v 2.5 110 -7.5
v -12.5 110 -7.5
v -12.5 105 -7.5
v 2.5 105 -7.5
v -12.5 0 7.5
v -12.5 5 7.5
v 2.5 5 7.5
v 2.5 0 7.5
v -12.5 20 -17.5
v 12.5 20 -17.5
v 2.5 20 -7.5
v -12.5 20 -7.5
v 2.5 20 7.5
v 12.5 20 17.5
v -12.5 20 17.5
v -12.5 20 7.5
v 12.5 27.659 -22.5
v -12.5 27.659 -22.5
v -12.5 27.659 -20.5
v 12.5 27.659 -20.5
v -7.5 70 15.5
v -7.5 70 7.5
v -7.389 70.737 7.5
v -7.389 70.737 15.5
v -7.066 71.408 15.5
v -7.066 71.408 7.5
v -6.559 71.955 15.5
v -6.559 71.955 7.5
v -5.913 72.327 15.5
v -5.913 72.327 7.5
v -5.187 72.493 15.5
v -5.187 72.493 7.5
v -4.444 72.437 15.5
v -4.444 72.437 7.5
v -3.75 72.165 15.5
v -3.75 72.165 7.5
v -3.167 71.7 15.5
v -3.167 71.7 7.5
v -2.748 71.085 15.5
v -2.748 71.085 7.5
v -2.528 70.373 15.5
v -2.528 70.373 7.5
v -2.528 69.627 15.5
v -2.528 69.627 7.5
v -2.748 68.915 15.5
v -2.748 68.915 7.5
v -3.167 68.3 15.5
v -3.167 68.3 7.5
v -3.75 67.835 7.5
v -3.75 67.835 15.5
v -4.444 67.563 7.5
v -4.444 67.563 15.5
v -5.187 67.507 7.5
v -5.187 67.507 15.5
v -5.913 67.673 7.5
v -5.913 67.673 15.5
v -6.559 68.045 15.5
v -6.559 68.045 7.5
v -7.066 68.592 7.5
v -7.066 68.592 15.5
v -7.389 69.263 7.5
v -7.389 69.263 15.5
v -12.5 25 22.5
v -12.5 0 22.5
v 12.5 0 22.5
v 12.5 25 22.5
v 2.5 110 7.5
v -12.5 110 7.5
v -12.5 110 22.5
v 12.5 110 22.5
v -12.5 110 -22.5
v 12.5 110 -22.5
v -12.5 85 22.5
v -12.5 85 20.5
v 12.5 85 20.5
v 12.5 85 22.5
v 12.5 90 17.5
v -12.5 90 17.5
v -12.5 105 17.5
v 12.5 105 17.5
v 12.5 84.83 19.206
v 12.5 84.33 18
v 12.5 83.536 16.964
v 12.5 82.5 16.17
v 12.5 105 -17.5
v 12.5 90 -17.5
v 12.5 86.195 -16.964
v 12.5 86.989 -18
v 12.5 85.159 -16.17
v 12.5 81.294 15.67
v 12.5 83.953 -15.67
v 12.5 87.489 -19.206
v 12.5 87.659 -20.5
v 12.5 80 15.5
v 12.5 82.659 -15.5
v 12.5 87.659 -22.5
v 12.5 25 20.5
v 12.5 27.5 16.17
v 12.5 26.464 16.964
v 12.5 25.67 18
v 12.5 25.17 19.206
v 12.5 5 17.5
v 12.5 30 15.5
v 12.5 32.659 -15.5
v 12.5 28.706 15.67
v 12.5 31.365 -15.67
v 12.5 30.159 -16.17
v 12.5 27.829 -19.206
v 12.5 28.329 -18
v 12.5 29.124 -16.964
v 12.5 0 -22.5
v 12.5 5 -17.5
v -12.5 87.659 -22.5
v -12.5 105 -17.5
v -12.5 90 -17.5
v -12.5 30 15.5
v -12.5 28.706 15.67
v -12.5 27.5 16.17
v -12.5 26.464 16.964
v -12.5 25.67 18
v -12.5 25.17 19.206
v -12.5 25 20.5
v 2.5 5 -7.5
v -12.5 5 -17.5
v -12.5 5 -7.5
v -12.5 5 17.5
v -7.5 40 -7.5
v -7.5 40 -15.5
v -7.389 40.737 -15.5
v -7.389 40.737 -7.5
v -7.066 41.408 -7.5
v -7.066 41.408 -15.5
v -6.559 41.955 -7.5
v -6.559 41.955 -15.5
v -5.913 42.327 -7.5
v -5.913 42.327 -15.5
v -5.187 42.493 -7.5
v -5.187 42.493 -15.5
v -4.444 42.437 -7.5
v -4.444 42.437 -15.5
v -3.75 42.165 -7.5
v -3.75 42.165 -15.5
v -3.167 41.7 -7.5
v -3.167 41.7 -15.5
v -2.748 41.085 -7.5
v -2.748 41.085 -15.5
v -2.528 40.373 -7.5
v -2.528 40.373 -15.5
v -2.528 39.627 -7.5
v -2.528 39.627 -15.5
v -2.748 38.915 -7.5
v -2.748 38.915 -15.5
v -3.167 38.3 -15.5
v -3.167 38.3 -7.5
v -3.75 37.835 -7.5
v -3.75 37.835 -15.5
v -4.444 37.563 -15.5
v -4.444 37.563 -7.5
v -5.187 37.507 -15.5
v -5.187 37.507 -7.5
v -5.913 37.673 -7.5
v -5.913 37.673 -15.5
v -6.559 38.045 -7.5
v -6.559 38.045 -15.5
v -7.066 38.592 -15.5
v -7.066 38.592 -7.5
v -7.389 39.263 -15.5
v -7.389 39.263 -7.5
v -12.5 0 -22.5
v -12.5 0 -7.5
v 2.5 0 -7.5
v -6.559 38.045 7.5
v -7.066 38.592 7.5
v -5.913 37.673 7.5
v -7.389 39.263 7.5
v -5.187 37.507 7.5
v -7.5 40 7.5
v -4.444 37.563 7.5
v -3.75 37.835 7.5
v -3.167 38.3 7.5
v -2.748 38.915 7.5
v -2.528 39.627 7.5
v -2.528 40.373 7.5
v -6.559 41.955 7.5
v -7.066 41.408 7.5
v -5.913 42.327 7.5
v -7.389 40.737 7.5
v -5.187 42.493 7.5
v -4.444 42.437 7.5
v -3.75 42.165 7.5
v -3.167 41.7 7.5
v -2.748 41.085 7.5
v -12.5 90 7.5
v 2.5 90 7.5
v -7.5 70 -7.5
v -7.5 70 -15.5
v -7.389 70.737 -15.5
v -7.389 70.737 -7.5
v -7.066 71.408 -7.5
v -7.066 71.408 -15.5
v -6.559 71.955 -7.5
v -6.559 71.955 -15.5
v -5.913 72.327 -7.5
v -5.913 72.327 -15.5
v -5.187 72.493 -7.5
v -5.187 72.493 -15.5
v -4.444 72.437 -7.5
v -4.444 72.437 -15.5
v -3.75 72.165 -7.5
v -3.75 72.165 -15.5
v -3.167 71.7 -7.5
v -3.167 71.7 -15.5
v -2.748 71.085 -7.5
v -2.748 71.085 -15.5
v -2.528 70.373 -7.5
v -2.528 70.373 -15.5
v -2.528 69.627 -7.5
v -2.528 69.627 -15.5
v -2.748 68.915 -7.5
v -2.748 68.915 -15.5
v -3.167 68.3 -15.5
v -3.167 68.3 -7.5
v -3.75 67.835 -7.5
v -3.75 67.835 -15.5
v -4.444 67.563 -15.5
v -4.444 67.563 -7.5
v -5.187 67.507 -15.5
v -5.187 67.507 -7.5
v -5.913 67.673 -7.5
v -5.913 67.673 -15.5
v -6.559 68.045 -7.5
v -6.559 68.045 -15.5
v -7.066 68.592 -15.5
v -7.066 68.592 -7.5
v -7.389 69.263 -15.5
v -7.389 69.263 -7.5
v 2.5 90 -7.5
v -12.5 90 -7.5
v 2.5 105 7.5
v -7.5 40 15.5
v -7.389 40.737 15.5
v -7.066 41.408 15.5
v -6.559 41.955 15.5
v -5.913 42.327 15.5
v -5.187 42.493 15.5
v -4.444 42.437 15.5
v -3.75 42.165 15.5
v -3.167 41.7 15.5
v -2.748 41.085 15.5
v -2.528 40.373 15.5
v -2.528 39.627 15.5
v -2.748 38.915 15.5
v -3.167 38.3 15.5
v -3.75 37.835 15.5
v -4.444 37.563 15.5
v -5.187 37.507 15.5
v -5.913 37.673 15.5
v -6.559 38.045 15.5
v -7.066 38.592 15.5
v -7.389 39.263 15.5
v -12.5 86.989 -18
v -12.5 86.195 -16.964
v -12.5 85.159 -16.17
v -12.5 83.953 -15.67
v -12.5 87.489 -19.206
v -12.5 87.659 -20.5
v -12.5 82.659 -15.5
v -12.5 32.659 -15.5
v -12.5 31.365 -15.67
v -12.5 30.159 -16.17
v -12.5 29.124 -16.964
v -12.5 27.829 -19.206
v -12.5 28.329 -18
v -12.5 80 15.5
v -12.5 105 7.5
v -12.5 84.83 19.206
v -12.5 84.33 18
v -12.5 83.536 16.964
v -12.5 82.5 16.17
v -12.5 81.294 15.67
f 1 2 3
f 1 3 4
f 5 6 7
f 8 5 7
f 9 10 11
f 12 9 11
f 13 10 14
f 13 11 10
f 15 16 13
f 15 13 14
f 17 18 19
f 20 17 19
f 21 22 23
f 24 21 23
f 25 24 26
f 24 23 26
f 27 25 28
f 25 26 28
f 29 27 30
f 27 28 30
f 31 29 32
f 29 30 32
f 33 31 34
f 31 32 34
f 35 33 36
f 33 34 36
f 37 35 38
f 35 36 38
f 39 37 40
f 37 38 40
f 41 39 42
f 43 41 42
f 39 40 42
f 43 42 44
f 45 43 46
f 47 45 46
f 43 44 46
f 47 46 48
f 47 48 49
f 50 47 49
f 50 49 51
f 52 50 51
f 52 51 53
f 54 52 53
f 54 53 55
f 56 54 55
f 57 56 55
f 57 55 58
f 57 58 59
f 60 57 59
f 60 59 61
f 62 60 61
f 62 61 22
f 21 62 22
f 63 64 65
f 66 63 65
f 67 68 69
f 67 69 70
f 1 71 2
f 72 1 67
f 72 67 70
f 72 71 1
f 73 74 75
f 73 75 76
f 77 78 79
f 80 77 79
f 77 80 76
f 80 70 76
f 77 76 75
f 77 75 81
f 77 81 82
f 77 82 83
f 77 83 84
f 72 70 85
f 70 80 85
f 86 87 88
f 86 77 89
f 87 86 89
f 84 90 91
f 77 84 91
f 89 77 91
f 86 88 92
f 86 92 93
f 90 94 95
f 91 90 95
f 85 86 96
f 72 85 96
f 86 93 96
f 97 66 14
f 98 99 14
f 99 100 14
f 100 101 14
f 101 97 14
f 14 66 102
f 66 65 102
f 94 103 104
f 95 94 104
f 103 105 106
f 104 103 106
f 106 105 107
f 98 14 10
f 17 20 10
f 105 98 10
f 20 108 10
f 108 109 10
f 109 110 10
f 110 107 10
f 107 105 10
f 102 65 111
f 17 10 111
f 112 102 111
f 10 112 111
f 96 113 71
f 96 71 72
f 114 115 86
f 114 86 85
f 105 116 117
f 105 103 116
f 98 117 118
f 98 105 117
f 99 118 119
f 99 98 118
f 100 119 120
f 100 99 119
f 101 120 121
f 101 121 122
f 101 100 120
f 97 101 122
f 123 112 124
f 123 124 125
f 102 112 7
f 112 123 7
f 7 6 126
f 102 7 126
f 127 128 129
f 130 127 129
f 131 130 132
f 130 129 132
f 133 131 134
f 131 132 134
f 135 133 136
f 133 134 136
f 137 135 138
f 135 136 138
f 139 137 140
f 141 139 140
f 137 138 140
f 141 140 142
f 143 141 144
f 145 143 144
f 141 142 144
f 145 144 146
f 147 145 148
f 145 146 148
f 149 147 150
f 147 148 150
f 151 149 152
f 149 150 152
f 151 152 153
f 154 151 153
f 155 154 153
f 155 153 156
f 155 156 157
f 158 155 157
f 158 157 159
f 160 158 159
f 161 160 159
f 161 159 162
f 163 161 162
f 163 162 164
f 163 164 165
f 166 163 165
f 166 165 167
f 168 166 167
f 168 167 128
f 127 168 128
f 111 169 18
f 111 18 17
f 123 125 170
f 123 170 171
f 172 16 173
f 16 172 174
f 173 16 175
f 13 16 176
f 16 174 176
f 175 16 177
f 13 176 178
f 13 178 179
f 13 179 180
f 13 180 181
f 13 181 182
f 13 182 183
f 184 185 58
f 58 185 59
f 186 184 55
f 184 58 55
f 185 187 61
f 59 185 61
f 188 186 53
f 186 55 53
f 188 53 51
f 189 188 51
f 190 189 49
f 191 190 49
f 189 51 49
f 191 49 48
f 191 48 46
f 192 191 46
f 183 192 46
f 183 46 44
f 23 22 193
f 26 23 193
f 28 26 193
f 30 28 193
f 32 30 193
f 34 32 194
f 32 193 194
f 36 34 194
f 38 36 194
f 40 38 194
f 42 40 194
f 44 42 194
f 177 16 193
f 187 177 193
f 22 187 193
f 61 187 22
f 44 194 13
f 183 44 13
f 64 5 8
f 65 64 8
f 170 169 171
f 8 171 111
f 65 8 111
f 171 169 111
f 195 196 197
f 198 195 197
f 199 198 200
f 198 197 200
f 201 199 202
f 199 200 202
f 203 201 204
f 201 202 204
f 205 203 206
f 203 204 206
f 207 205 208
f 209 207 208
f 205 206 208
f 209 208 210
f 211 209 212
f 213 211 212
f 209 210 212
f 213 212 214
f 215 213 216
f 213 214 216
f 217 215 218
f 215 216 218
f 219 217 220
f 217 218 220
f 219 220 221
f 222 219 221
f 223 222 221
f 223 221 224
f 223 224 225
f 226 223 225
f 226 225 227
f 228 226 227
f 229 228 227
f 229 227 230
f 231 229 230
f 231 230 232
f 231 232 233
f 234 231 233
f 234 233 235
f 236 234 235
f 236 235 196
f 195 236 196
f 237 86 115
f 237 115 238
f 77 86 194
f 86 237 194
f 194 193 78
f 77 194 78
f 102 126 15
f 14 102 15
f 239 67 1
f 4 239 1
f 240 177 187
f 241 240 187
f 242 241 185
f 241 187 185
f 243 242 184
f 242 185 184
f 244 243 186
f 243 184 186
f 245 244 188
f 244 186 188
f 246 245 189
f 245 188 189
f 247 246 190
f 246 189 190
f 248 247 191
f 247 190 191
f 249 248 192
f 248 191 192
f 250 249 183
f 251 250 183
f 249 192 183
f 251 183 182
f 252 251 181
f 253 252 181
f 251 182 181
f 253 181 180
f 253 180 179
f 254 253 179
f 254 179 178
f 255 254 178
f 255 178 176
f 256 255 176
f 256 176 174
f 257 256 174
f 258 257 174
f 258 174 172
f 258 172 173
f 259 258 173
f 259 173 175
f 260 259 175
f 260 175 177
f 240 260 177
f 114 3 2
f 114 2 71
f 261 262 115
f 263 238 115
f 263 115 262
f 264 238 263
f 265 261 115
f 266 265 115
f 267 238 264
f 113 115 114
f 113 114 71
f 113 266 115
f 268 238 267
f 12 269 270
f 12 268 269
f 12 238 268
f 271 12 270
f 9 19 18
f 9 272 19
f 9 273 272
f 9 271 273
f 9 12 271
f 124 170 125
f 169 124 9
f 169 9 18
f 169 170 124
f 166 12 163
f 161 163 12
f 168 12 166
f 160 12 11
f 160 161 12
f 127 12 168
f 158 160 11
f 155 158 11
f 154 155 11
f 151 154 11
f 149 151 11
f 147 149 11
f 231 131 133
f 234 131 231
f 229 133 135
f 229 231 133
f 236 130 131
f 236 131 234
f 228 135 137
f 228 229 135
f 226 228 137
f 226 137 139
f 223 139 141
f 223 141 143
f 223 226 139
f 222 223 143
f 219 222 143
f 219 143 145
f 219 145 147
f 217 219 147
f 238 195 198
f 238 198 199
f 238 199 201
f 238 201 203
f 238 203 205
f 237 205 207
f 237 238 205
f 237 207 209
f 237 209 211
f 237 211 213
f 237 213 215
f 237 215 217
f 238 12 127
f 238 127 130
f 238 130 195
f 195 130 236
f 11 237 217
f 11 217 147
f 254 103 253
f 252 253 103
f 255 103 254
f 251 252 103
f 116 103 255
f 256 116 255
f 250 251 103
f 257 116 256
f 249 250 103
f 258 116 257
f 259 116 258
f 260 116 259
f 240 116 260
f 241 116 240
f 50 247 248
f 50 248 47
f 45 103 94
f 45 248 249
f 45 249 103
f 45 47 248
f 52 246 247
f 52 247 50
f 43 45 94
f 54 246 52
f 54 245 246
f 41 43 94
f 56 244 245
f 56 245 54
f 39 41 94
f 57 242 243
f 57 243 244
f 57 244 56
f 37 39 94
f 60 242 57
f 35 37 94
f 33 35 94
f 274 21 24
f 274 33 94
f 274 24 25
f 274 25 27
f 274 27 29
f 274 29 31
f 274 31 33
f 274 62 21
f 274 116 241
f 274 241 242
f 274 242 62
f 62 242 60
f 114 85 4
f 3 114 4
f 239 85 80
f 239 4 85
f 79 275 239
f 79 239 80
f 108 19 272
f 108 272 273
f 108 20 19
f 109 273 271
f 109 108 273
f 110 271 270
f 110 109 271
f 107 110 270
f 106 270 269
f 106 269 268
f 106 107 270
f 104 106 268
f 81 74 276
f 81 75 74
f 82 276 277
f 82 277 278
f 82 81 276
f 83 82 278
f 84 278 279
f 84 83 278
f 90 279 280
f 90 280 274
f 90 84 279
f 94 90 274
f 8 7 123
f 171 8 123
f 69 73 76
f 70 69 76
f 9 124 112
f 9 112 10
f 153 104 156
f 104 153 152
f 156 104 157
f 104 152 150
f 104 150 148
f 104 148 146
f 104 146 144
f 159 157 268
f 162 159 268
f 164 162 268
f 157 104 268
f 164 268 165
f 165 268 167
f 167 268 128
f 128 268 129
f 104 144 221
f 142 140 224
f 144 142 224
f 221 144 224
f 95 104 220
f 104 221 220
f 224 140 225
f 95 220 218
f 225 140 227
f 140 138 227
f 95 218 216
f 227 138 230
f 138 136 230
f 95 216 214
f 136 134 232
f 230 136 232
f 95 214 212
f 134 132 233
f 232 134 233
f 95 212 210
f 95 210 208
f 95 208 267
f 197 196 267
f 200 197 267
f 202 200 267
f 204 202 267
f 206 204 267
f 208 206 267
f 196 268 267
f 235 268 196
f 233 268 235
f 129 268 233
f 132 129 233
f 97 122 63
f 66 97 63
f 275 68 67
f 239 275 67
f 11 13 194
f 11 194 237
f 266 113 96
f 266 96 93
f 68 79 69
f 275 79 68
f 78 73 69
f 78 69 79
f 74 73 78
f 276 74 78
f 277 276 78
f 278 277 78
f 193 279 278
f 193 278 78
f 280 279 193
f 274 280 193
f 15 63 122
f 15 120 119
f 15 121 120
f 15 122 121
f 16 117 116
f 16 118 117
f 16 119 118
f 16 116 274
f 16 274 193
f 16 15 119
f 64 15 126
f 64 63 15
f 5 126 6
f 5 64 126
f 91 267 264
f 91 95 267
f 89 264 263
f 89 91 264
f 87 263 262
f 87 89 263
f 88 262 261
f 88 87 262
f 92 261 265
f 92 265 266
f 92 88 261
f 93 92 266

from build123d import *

# Parameters (mm, degrees)
SKETCH_1_W          = 25
SKETCH_1_H          = 45
EXTRUDE_1_DEPTH     = 110
SKETCH_2_W          = 15
SKETCH_2_H          = 15
CUT_EXTRUDE_2_DEPTH = 110
SKETCH_3_W          = 35
SKETCH_3_H          = 15
CUT_EXTRUDE_3_DEPTH = 38
SKETCH_4_W          = 7
SKETCH_4_H          = 60
CUT_EXTRUDE_4_DEPTH = 38
SKETCH_5_W          = 35
SKETCH_5_H          = 15
CUT_EXTRUDE_5_DEPTH = 38
FILLET_1_R          = 5
SKETCH_6_W          = 7
SKETCH_6_H          = 60
CUT_EXTRUDE_6_DEPTH = 38
FILLET_3_R          = 5
SKETCH_7_R          = 2.5
CUT_EXTRUDE_7_DEPTH = 40


with BuildPart() as part:
    # 草图1 → 凸台-拉伸1 (new body)
    with BuildSketch(Plane(origin=(0, 0, 0), x_dir=(1, 0, 0), z_dir=(0, 1, 0))):
        Rectangle(SKETCH_1_W, SKETCH_1_H)
    extrude(amount=EXTRUDE_1_DEPTH)

    # 草图2 → 切除-拉伸2 (cut)
    with BuildSketch(Plane(origin=(0, 110, 0), x_dir=(1, 0, 0), z_dir=(0, 1, 0))):
        with Locations((-5, 0)):
            Rectangle(SKETCH_2_W, SKETCH_2_H)
    extrude(amount=-CUT_EXTRUDE_2_DEPTH, mode=Mode.SUBTRACT)

    # 草图3 → 切除-拉伸3 (cut)
    with BuildSketch(Plane.ZY.offset(12.5)):
        with Locations((0, 12.5)):
            Rectangle(SKETCH_3_W, SKETCH_3_H)
    extrude(amount=-CUT_EXTRUDE_3_DEPTH, mode=Mode.SUBTRACT)

    # 草图4 → 切除-拉伸4 (cut)
    with BuildSketch(Plane.ZY.offset(12.5)):
        with Locations((19, 55)):
            Rectangle(SKETCH_4_W, SKETCH_4_H)
    extrude(amount=-CUT_EXTRUDE_4_DEPTH, mode=Mode.SUBTRACT)

    # 草图5 → 切除-拉伸5 (cut)
    with BuildSketch(Plane.ZY.offset(12.5)):
        with Locations((0, 97.5)):
            Rectangle(SKETCH_5_W, SKETCH_5_H)
    extrude(amount=-CUT_EXTRUDE_5_DEPTH, mode=Mode.SUBTRACT)

    # 圆角1
    fillet_1_edges = [part.edges().sort_by_distance(p)[0] for p in [
        (0, 25, 15.5),
        (0, 85, 15.5),
    ]]
    fillet(fillet_1_edges, radius=FILLET_1_R)

    # 草图6 → 切除-拉伸6 (cut)
    with BuildSketch(Plane.ZY.offset(12.5)):
        with Locations((-19, 57.659101088)):
            Rectangle(SKETCH_6_W, SKETCH_6_H)
    extrude(amount=-CUT_EXTRUDE_6_DEPTH, mode=Mode.SUBTRACT)

    # 圆角3
    fillet_3_edges = [part.edges().sort_by_distance(p)[0] for p in [
        (0, 87.659101088, -15.5),
        (0, 27.659101088, -15.5),
    ]]
    fillet(fillet_3_edges, radius=FILLET_3_R)

    # 草图7 → 切除-拉伸7 (cut)
    with BuildSketch(Plane(origin=(0, 0, -15.5), x_dir=(-1, 0, 0), z_dir=(0, 0, -1))):
        with Locations((5, 40)):
            Circle(SKETCH_7_R)
        with Locations((5, 70)):
            Circle(SKETCH_7_R)
    extrude(amount=-CUT_EXTRUDE_7_DEPTH, mode=Mode.SUBTRACT)


solid = part.part
